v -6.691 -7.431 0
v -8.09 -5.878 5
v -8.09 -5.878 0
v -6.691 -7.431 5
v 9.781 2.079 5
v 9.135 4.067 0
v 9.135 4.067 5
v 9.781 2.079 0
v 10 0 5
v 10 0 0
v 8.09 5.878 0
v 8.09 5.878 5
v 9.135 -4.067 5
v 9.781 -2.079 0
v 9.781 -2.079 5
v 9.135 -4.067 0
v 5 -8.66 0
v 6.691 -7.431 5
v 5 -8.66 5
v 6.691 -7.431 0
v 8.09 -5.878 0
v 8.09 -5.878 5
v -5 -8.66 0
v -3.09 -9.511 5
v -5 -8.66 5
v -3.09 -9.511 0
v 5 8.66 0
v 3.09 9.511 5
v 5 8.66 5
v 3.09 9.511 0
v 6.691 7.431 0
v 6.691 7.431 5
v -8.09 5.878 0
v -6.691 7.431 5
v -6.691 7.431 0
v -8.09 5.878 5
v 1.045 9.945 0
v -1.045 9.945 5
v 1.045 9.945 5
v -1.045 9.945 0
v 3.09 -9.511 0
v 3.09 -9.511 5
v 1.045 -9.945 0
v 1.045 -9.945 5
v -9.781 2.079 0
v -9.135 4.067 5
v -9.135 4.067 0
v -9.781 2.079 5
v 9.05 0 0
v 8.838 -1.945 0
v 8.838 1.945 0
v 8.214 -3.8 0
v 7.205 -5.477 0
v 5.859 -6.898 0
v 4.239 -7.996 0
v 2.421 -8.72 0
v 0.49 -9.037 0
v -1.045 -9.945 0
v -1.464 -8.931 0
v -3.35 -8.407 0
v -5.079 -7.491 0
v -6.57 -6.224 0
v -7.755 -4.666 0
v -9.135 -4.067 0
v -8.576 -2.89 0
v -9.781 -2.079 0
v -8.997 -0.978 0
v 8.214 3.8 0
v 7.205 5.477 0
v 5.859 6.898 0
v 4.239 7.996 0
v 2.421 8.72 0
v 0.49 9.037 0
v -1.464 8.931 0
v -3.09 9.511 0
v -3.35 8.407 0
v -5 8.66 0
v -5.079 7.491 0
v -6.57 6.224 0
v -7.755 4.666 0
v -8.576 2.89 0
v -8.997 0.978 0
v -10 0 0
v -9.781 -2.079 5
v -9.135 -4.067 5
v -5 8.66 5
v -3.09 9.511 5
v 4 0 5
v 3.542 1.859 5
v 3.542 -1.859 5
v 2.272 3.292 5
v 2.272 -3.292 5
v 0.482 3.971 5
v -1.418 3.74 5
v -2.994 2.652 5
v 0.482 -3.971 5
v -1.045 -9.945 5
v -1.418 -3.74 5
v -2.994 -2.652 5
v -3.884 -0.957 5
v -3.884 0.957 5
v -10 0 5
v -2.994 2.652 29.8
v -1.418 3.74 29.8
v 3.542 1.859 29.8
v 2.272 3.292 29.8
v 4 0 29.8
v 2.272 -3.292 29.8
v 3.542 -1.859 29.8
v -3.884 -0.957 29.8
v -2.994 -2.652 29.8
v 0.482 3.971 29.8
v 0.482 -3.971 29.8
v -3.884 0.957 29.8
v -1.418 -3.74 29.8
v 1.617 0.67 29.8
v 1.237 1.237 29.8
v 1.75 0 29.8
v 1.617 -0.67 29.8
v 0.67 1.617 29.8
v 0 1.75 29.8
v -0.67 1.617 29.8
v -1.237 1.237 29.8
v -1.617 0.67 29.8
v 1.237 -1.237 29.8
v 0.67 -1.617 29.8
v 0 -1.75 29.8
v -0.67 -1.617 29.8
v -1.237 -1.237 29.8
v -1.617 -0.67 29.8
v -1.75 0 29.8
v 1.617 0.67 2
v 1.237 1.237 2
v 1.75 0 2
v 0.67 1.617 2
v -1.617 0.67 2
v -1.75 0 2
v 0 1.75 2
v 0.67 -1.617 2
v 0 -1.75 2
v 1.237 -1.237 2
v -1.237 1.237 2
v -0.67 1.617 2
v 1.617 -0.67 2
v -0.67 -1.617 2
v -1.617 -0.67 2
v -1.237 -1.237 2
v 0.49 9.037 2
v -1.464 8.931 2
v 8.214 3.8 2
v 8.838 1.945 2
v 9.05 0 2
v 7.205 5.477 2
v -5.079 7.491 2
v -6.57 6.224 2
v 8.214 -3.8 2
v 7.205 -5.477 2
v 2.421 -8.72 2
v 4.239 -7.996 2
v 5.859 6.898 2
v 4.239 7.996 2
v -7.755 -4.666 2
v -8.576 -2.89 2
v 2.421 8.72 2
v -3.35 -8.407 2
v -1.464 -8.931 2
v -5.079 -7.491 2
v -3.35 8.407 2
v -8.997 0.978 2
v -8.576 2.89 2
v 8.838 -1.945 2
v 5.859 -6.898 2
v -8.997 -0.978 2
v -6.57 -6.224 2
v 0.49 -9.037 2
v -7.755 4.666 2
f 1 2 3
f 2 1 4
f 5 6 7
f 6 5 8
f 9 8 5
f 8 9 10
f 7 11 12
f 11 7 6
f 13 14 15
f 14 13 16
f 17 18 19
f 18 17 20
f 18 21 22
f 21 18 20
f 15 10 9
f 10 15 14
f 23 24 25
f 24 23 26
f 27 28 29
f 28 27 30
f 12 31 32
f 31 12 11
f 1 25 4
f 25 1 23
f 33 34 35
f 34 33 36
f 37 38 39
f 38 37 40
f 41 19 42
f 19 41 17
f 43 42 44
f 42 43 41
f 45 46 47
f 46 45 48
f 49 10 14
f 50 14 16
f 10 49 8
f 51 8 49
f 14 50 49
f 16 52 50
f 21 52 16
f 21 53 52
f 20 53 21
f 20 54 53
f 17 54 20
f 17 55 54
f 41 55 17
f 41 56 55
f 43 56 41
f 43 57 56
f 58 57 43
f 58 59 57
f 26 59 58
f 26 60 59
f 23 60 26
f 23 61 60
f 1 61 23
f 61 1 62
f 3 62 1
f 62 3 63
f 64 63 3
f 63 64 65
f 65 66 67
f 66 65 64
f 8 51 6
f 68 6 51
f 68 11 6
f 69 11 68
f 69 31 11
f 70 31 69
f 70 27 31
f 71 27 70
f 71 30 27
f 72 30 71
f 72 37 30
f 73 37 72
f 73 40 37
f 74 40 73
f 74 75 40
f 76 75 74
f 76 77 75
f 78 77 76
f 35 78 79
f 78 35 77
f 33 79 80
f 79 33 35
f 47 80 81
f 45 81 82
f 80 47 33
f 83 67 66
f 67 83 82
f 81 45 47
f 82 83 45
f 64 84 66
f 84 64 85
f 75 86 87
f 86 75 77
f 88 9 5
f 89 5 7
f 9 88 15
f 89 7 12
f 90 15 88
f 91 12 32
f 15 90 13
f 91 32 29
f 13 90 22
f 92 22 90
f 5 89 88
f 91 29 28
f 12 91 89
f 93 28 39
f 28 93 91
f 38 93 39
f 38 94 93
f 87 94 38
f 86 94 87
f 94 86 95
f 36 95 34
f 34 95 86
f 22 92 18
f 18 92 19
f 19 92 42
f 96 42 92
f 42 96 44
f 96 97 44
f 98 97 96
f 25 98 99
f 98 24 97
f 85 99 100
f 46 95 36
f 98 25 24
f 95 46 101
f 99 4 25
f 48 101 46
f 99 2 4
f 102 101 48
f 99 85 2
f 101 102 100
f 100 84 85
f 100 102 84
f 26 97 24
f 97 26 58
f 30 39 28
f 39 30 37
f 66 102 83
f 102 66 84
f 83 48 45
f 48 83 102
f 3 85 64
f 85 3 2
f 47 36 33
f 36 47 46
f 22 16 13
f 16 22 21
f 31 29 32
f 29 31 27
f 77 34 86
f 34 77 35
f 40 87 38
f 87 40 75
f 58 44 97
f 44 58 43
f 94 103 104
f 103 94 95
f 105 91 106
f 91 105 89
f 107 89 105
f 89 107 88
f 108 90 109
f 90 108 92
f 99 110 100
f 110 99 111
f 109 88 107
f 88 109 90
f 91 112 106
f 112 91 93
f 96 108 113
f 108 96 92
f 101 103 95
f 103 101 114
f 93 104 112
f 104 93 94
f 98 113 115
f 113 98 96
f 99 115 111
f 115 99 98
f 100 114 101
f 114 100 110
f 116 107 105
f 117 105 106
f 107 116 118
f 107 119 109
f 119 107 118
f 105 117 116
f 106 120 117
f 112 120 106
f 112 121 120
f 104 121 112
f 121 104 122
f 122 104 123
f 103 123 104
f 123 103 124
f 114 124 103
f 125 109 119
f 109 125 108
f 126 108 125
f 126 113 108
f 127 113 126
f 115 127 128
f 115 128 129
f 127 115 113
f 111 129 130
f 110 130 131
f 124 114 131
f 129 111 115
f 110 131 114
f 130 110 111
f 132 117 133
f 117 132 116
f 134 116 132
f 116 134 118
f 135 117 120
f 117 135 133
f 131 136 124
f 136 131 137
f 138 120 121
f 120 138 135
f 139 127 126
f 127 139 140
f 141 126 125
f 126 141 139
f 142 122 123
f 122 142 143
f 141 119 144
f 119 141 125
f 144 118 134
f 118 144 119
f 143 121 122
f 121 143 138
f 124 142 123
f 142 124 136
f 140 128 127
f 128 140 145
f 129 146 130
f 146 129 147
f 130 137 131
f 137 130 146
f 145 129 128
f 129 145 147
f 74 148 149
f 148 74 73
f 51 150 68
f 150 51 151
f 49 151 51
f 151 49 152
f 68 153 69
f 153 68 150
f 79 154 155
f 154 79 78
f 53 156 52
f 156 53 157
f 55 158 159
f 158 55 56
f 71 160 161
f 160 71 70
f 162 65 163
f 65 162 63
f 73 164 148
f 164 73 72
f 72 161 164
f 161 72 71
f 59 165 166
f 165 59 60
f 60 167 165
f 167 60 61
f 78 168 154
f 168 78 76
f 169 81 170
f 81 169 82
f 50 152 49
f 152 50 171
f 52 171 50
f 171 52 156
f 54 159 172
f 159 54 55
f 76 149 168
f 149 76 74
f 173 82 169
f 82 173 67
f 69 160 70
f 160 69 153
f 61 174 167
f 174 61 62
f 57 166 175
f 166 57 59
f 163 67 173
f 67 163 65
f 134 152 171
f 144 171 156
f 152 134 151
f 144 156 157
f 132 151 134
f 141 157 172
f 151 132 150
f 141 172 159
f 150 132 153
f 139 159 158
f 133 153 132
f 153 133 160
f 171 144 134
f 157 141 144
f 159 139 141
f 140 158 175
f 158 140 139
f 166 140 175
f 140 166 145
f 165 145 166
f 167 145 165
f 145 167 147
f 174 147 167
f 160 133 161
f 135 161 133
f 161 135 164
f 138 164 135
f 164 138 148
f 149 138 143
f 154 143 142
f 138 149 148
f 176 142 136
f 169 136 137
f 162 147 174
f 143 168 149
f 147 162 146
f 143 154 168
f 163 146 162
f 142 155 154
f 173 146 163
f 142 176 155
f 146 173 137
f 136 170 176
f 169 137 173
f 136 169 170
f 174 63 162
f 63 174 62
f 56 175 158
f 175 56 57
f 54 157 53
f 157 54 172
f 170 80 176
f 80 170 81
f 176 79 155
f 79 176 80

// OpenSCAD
// jig om precies in het midden van een 18mm rond hout een gaatje te boren van 2.5 mm
// jig to dril a 2.5mm hole in the middle of a 18 mm round wood staff/stick

difference(){
    union(){
    cylinder (d=20,h=5);
    translate([0,0,4.8]) cylinder(d=8,h=25);
    }
    translate([0,0,-1]) cylinder(d=3.5,h=35,$fn=16);
    translate([0,0,-1]) cylinder(d=18.1,h=3);
    }
